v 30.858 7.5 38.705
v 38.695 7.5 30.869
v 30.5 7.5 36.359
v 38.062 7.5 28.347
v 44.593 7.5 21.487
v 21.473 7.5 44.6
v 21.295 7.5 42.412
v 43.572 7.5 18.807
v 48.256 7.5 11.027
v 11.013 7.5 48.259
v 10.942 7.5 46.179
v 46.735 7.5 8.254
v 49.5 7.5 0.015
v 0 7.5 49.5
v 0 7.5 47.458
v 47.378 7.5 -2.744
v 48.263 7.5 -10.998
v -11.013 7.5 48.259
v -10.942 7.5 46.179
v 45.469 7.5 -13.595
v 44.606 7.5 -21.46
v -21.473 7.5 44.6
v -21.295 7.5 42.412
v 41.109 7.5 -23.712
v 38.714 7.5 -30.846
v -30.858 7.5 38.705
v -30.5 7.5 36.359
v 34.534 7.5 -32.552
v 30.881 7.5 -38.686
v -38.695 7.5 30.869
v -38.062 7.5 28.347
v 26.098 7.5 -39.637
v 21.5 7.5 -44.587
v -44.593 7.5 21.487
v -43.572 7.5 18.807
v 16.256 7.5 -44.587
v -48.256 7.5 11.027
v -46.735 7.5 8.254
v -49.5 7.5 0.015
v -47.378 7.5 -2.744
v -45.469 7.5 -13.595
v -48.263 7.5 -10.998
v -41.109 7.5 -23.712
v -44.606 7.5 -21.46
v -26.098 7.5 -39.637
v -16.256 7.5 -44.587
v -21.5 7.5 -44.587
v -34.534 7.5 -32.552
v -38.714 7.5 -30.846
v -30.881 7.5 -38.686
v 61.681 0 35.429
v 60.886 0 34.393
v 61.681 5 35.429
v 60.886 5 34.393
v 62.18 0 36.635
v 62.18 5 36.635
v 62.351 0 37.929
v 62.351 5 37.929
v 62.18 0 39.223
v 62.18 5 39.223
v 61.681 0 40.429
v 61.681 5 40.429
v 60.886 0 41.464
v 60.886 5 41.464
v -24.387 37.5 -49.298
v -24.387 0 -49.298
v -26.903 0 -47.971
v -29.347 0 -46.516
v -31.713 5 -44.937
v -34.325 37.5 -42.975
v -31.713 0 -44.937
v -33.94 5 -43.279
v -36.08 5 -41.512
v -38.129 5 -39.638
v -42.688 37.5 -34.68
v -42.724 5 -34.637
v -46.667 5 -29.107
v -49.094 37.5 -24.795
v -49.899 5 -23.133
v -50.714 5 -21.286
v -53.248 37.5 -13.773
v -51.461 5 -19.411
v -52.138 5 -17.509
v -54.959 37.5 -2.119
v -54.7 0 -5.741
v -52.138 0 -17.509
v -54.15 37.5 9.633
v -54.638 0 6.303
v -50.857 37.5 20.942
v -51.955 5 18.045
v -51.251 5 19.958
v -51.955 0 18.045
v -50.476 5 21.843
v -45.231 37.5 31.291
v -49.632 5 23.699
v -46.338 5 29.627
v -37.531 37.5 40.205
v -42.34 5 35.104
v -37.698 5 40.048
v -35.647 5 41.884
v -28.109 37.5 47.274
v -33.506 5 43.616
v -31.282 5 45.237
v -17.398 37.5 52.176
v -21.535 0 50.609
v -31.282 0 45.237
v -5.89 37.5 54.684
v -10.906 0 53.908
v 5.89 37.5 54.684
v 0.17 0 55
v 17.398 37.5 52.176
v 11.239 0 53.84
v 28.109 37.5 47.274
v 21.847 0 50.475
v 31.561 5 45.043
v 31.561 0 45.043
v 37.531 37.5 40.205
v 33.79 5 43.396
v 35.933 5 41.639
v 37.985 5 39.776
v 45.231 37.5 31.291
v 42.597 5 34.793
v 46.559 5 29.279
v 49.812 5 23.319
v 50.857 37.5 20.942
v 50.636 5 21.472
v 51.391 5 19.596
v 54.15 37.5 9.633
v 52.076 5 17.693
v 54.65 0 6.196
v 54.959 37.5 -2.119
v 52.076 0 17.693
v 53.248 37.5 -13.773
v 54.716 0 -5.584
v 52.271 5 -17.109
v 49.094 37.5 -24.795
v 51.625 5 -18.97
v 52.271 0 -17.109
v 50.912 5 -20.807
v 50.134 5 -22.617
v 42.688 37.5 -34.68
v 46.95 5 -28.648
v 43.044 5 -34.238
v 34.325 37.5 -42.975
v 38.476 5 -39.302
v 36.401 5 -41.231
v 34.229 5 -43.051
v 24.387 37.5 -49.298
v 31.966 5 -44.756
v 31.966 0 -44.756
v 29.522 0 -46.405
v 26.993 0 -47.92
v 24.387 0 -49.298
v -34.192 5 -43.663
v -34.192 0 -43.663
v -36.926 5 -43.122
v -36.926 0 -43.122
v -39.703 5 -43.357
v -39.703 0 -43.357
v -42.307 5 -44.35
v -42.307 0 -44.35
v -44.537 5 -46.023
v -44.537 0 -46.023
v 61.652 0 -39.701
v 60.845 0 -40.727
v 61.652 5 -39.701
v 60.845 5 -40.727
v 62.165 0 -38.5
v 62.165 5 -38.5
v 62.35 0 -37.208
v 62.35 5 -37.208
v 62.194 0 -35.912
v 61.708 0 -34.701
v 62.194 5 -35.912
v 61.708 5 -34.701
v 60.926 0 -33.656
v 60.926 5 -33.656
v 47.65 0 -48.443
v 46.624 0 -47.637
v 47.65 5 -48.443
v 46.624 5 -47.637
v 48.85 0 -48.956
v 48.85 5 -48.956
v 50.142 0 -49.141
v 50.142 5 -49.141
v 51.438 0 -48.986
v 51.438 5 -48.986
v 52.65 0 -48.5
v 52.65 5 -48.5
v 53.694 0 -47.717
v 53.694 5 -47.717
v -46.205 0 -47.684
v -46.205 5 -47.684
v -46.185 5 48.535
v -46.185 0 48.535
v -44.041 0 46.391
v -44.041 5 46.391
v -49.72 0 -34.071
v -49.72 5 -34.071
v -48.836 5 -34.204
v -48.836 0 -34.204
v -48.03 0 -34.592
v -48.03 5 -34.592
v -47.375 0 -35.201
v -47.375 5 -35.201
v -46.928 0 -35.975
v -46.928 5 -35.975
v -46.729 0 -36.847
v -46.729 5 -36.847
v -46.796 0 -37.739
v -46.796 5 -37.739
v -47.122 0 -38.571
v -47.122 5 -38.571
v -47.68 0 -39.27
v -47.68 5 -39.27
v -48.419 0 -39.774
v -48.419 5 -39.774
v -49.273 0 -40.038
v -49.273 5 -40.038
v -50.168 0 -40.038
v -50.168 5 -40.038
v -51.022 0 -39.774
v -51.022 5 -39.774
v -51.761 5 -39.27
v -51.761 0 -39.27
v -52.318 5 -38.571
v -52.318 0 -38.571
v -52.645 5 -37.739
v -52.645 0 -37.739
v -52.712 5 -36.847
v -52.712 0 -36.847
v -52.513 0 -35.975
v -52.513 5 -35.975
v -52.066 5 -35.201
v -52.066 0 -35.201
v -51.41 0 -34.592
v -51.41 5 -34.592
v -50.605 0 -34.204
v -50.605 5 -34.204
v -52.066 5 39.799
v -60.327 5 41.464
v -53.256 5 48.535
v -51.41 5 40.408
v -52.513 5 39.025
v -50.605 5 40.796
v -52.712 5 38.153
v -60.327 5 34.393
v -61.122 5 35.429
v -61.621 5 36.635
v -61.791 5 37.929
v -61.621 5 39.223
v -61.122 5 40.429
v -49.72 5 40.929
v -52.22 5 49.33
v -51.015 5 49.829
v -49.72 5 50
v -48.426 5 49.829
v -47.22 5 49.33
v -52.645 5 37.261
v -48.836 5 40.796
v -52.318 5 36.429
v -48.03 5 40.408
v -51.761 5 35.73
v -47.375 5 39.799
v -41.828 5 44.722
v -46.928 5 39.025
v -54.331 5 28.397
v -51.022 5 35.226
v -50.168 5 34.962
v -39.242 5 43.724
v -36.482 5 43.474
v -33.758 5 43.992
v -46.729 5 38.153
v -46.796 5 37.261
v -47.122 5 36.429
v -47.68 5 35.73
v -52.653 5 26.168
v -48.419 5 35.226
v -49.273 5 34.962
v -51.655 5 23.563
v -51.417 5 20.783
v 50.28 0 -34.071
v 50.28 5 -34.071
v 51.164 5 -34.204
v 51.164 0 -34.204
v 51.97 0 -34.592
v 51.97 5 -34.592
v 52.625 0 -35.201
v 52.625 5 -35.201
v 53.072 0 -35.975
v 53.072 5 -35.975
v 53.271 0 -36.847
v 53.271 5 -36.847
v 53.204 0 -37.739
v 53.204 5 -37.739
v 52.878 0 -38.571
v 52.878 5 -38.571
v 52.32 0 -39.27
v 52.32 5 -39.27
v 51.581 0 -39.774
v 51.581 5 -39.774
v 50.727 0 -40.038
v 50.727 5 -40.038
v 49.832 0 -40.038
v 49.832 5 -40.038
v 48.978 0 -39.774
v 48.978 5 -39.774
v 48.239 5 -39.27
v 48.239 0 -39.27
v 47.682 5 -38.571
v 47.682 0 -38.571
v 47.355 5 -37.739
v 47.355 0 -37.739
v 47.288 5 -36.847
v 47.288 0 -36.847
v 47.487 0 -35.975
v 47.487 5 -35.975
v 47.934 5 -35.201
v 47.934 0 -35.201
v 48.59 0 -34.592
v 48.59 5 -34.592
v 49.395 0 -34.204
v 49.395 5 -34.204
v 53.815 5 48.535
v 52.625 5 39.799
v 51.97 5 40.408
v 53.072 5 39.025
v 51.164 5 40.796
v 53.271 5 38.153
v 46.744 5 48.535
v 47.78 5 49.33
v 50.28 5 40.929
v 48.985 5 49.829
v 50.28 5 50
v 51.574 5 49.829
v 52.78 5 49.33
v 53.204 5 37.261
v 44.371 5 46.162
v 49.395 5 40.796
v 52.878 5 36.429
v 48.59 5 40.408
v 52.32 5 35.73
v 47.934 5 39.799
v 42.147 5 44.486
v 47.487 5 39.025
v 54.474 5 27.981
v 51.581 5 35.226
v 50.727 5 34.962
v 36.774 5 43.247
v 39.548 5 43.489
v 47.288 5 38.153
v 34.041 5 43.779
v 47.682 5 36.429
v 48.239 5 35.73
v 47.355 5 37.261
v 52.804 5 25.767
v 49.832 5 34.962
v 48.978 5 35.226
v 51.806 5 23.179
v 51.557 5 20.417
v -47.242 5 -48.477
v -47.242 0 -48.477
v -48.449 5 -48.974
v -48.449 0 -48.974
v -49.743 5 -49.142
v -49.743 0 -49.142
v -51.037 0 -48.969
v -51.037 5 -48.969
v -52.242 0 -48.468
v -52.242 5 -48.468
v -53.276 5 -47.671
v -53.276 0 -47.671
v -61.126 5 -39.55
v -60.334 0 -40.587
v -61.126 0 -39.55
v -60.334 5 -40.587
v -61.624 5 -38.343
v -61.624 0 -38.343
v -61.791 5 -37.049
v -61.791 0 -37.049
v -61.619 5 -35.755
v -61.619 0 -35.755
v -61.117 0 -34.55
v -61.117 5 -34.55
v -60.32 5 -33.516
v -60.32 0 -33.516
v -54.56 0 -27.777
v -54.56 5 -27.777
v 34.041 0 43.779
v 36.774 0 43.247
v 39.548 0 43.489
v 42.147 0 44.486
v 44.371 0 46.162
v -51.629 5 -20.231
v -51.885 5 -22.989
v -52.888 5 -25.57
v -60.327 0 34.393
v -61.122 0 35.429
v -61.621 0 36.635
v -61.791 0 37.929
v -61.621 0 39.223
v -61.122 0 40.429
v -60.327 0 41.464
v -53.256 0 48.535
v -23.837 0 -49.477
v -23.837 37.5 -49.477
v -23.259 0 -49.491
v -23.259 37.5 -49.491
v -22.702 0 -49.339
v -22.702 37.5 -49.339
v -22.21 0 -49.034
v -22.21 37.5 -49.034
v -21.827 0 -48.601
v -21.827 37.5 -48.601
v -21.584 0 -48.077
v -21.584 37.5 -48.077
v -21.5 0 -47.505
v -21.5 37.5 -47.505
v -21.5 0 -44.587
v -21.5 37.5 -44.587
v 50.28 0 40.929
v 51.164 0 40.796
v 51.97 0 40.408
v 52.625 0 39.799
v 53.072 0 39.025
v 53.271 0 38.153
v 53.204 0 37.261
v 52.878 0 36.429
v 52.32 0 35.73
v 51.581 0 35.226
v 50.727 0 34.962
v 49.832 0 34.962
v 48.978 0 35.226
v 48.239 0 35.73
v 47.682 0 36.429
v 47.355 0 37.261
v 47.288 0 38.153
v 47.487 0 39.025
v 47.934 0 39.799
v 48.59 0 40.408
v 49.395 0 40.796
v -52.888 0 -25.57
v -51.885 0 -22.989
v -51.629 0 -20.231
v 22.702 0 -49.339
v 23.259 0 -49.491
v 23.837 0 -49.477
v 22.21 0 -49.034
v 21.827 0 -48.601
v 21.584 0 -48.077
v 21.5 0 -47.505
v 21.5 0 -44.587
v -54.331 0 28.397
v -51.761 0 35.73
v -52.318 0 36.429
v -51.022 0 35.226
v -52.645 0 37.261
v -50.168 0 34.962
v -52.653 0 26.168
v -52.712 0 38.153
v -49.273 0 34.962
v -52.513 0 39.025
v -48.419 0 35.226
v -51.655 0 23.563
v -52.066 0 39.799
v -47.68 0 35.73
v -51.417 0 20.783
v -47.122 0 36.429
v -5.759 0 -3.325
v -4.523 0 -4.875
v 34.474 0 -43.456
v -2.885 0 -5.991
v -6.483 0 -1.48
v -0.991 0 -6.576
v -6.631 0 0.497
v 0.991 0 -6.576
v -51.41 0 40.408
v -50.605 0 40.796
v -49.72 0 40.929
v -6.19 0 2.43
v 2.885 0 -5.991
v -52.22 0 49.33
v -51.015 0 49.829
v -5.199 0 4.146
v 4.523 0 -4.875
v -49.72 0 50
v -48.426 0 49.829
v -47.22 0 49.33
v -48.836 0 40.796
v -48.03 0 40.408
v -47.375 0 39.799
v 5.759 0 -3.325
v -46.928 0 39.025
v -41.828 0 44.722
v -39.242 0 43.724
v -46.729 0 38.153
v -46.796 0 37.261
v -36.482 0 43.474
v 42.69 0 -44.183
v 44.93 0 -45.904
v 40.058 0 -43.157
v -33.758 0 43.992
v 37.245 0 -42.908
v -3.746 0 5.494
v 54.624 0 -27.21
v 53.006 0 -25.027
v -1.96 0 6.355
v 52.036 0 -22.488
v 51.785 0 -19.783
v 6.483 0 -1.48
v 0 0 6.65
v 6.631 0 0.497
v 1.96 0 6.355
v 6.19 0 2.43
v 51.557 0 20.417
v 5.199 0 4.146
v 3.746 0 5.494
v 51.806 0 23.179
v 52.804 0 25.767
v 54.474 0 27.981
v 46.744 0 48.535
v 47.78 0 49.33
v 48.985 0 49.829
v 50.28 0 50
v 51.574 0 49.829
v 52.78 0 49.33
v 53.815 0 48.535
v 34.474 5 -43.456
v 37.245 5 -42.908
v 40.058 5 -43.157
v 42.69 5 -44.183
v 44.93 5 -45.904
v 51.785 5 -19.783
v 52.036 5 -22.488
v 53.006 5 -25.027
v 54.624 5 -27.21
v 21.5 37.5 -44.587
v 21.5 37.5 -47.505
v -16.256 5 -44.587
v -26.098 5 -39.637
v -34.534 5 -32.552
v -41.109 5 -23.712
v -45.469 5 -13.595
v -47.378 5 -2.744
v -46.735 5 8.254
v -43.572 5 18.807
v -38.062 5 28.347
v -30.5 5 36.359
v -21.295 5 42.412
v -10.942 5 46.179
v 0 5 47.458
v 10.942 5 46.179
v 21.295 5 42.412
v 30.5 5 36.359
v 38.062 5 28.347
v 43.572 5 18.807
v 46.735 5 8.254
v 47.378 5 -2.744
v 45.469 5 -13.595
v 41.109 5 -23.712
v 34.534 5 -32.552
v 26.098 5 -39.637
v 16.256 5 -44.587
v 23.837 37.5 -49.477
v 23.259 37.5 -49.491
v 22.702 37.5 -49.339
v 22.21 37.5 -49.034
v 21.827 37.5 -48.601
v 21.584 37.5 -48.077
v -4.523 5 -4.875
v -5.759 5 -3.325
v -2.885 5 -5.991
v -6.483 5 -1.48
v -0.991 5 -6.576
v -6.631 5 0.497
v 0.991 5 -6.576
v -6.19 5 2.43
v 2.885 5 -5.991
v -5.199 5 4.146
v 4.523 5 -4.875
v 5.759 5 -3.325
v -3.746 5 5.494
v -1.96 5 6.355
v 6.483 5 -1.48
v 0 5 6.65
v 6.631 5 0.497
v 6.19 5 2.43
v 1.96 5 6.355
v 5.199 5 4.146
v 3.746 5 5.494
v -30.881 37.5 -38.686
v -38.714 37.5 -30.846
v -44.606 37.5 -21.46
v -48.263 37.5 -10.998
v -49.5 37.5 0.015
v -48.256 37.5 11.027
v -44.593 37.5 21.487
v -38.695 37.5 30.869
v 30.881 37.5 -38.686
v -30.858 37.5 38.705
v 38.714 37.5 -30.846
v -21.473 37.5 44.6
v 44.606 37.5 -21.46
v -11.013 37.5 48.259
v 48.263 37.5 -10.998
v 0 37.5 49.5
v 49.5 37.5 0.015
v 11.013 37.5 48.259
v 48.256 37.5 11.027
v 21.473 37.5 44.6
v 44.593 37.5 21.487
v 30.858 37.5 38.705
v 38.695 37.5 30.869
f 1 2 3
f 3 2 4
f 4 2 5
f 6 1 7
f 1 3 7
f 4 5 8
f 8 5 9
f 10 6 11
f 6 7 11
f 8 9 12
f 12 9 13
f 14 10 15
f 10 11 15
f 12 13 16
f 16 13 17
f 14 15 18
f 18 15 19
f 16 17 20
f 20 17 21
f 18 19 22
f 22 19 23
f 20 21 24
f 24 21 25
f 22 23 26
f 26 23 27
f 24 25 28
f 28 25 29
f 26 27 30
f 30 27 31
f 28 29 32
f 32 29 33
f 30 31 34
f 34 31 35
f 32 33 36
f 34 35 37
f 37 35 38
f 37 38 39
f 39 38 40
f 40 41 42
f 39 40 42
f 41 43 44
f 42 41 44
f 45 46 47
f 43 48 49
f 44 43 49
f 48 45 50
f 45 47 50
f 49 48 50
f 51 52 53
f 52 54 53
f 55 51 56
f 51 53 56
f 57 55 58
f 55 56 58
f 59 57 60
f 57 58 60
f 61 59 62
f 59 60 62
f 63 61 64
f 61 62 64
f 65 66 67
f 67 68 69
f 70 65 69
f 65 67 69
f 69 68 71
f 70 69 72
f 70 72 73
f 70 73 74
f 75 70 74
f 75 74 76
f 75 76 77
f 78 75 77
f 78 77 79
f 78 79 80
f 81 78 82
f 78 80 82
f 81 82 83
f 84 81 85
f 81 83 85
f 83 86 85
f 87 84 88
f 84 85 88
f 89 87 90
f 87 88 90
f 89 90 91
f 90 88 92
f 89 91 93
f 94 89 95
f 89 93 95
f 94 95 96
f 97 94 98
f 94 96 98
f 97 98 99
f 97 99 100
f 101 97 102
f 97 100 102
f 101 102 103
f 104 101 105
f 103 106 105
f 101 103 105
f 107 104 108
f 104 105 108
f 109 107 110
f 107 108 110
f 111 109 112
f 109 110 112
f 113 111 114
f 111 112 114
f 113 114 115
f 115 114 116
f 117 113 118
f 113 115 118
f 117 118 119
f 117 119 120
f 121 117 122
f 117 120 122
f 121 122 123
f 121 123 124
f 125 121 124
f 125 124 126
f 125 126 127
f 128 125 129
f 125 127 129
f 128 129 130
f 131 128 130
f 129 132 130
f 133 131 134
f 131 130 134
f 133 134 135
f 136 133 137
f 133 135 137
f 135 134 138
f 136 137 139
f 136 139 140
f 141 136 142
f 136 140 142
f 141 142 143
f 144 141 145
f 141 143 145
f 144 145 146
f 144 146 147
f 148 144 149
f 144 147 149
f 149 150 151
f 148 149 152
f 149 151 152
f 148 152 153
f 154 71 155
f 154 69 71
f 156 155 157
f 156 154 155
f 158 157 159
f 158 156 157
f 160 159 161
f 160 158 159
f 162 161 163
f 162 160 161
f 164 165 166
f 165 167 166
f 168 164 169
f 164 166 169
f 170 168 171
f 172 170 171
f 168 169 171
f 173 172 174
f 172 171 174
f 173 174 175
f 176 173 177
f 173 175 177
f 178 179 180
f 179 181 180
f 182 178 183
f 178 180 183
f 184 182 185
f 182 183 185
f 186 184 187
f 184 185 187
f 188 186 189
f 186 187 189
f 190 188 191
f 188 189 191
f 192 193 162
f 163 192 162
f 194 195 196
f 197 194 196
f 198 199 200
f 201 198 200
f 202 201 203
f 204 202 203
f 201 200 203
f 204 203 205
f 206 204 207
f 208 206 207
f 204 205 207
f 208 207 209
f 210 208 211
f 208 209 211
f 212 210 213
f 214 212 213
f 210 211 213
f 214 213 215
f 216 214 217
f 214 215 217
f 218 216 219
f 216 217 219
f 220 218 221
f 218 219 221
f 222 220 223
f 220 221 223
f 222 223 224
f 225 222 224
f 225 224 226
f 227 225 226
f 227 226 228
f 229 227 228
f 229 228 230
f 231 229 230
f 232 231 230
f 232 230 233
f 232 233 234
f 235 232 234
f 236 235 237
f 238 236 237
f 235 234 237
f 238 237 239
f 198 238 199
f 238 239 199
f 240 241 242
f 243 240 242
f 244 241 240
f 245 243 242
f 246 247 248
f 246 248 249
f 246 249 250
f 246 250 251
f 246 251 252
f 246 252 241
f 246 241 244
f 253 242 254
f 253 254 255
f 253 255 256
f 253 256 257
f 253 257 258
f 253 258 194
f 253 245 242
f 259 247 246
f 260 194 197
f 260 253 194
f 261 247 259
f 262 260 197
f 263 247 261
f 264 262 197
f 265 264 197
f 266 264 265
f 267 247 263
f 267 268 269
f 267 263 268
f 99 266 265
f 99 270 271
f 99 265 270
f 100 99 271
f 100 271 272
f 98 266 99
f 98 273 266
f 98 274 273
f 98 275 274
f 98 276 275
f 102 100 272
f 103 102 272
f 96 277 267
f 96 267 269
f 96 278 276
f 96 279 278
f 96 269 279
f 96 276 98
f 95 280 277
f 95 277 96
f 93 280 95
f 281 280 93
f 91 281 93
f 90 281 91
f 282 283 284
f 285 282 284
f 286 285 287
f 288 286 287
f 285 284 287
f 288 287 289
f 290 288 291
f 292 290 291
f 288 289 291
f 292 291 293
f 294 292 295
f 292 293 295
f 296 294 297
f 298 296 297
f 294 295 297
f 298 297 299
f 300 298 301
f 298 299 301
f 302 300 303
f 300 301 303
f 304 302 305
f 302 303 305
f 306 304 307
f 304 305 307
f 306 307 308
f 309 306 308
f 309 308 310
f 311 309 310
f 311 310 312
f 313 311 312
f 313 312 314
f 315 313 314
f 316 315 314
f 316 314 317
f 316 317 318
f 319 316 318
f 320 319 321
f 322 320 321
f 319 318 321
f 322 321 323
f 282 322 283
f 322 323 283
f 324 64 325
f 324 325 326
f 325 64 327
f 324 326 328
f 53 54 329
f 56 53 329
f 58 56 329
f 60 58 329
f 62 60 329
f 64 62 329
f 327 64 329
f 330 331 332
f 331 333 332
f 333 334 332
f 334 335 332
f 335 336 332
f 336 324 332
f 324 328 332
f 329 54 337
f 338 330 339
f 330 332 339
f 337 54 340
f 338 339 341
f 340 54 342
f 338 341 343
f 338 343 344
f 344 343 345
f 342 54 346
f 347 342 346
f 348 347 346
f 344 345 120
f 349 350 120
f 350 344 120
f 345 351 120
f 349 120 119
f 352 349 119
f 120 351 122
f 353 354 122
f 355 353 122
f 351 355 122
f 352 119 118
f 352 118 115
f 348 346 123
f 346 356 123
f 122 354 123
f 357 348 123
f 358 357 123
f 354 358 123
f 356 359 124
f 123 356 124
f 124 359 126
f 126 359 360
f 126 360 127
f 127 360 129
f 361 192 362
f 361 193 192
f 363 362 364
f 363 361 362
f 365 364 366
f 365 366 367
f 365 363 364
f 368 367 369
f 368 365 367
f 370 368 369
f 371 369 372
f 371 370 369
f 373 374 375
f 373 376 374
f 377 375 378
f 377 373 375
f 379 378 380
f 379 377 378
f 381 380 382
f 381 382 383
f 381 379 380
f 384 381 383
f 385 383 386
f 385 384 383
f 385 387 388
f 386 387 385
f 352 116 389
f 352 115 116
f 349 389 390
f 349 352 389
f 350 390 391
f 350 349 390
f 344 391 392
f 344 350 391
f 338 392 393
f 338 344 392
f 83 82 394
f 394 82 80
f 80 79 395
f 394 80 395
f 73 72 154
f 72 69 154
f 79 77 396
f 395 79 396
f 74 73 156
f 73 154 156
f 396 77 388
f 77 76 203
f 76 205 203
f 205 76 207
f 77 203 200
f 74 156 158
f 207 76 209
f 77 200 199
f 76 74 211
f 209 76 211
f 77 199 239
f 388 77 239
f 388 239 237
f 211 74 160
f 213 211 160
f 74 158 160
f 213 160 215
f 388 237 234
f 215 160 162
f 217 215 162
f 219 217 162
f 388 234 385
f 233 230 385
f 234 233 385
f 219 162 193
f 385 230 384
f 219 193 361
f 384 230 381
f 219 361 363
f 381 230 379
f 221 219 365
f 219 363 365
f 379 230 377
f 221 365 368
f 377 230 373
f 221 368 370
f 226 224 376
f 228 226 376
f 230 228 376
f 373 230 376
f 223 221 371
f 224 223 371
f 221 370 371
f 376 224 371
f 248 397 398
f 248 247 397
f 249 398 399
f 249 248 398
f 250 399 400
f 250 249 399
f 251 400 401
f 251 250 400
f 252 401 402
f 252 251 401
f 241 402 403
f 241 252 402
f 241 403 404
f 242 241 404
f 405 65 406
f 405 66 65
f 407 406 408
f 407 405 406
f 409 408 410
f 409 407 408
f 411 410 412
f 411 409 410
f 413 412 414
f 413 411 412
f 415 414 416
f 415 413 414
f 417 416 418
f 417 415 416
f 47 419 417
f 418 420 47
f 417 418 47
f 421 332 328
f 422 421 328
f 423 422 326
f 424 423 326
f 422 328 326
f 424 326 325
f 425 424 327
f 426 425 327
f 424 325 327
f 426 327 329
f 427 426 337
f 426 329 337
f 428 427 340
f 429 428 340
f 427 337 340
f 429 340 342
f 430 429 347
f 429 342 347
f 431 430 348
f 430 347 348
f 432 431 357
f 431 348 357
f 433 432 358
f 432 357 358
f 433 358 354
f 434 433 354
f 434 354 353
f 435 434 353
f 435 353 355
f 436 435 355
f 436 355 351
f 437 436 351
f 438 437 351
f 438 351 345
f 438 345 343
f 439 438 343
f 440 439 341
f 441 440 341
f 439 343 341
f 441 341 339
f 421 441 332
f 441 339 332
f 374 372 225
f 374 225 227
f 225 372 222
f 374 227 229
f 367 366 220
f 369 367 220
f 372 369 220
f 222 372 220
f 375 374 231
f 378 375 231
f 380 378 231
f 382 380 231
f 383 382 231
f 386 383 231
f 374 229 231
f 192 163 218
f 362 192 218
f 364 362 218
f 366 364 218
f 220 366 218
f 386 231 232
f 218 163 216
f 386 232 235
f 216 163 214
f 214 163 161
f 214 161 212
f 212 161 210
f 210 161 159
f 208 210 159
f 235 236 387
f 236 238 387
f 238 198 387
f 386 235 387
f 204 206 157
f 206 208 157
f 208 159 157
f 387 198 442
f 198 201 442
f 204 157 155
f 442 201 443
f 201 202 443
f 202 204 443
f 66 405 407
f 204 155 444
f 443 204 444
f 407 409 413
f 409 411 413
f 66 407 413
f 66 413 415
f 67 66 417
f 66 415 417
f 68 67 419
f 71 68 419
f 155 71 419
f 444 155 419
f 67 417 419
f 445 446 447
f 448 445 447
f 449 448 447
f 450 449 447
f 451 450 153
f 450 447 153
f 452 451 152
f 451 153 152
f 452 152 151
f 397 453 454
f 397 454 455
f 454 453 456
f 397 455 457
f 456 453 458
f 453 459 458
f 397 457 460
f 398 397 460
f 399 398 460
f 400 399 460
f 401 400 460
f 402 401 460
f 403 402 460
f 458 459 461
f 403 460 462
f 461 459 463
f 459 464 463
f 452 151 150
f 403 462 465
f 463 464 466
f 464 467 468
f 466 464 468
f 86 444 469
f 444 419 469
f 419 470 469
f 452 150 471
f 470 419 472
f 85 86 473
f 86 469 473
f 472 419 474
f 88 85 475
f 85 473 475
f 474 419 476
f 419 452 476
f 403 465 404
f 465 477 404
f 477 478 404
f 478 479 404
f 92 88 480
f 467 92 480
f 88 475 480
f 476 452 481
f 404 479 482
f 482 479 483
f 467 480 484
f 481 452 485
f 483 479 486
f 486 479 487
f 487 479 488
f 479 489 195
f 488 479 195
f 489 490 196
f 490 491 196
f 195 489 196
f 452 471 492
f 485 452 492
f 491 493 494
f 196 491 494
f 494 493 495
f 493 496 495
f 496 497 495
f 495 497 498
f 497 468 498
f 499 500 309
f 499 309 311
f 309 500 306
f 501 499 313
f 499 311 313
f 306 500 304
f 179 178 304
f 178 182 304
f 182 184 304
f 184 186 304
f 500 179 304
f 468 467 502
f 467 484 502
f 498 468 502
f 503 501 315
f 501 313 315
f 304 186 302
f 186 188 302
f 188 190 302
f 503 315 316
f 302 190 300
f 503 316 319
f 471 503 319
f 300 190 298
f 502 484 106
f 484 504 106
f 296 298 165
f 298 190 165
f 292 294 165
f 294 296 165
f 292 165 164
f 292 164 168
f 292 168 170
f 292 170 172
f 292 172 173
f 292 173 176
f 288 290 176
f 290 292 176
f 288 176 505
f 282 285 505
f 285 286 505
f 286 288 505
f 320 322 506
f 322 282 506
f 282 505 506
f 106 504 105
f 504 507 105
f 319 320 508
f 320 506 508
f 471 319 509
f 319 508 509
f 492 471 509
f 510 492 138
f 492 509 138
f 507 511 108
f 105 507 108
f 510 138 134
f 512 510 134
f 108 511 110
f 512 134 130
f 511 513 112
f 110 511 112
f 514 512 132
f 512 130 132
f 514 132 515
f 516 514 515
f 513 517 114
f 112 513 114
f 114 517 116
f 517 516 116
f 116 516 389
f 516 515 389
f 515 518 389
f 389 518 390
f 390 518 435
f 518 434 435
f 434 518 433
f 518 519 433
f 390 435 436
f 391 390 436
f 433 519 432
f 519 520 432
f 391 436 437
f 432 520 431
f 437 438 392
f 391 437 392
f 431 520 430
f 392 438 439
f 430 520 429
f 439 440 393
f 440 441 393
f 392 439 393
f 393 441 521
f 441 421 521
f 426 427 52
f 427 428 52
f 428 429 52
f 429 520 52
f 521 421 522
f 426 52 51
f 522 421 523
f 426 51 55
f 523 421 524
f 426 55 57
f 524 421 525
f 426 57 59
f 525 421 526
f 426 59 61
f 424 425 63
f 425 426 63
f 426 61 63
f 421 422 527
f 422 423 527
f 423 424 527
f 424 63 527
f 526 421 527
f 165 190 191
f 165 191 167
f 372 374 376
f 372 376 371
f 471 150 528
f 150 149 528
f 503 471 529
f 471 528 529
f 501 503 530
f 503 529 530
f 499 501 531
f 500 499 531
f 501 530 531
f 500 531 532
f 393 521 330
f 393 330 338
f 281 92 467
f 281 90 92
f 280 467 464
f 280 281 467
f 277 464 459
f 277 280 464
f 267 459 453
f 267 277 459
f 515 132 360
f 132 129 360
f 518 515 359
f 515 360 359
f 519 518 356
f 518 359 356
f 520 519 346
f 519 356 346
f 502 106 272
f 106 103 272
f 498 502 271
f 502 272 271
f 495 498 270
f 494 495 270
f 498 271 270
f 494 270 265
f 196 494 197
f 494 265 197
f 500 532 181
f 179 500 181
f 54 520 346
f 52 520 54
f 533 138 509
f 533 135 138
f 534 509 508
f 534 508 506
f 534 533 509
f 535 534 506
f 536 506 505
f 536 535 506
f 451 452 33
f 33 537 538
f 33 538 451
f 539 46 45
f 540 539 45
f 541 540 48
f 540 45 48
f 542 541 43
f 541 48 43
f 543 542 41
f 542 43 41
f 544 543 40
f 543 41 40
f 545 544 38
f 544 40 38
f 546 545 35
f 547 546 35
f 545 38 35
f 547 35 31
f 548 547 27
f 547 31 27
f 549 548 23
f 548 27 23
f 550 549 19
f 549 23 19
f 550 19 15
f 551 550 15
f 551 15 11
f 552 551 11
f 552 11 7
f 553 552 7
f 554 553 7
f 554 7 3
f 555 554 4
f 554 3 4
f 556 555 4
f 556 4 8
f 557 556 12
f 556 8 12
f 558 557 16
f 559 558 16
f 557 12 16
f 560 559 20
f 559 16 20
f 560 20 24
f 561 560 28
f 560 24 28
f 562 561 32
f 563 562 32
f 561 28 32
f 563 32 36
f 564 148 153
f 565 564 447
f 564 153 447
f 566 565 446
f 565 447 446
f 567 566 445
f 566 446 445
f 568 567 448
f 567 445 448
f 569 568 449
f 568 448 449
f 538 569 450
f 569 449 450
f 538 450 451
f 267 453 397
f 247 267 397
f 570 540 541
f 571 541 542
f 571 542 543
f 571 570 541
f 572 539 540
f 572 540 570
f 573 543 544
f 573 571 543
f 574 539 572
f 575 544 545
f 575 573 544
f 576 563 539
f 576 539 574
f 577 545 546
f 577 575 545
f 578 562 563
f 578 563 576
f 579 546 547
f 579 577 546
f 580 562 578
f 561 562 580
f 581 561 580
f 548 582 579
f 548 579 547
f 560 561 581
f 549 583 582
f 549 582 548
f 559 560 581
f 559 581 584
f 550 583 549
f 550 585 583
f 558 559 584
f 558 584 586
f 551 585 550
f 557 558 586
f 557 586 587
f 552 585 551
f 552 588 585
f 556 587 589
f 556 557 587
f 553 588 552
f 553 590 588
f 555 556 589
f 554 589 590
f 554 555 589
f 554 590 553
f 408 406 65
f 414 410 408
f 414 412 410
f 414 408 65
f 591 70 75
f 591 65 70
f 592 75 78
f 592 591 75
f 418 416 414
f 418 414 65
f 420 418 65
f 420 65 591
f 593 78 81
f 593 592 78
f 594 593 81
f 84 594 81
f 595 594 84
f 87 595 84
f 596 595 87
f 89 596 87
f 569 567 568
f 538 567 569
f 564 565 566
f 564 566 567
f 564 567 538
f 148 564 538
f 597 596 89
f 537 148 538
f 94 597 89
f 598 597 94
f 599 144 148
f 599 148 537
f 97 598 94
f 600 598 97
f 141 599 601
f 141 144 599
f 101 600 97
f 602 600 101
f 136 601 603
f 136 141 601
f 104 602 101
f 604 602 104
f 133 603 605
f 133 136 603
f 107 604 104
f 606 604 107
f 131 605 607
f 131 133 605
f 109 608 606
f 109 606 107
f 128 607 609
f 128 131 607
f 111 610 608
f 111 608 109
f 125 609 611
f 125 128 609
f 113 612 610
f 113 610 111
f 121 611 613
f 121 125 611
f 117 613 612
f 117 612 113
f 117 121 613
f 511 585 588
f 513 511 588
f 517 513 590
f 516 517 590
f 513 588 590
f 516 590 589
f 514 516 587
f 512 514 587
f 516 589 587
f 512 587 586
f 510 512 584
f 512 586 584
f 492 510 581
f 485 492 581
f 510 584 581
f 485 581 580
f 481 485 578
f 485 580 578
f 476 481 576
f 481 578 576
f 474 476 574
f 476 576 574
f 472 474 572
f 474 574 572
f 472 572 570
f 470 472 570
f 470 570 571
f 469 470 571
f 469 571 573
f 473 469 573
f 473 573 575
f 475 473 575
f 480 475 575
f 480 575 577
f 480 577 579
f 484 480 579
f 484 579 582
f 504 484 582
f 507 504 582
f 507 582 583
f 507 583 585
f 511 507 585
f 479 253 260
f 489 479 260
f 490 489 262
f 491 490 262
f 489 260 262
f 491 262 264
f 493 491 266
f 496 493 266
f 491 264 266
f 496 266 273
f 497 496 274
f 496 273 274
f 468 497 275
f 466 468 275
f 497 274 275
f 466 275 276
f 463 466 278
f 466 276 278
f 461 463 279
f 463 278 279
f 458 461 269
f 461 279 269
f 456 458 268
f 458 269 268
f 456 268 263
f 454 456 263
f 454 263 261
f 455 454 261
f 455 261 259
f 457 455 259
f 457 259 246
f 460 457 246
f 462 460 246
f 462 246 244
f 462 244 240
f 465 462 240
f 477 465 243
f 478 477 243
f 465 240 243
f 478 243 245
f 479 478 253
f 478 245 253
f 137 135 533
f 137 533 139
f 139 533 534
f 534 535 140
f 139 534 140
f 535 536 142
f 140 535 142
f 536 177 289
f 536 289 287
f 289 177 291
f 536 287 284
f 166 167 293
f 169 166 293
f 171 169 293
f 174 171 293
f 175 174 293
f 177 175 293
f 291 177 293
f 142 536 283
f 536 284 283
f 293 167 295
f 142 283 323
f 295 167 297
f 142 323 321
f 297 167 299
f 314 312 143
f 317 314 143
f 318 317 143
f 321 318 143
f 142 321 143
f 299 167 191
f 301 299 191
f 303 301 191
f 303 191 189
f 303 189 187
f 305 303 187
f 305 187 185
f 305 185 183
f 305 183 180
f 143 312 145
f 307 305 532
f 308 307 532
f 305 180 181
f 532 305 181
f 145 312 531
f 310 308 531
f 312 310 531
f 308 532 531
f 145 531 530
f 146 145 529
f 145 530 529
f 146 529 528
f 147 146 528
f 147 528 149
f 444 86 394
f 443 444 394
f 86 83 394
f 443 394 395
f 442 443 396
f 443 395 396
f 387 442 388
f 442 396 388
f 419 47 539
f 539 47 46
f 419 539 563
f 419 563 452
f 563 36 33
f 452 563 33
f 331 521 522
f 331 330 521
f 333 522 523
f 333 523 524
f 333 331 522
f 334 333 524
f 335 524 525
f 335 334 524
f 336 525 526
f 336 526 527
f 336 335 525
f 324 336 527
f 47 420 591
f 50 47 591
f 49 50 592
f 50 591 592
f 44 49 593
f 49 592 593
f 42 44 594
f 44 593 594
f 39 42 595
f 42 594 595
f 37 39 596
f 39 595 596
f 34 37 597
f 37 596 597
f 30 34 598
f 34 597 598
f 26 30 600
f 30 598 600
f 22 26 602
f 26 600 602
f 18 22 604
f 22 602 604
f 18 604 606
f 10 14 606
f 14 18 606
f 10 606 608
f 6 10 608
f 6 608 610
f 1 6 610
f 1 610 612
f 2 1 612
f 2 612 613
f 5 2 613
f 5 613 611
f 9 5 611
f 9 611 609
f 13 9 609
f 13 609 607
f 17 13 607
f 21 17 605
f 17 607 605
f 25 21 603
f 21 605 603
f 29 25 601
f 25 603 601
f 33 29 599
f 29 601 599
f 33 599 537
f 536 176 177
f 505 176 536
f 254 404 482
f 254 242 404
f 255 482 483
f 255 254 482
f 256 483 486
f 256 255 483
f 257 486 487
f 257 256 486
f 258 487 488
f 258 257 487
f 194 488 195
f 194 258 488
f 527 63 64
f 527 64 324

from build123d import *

# Parameters (mm, degrees)
SKETCH_1_R          = 55
EXTRUDE_1_DEPTH     = 37.5
SKETCH_3_R          = 49.5
CUT_EXTRUDE_1_DEPTH = 32.5
SKETCH_5_W          = 43
SKETCH_5_H          = 12.242897151
CUT_EXTRUDE_2_DEPTH = 40
FILLET_4_R          = 2
FILLET_5_R          = 2
SKETCH_6_R          = 6.65
CUT_EXTRUDE_3_DEPTH = 12
EXTRUDE_START       = -5
EXTRUDE_3_DEPTH     = 5
FILLET_7_R          = 10
FILLET_8_R          = 5
SKETCH_10_R         = 3
CUT_EXTRUDE_5_DEPTH = 5
EXTRUDE_START_2     = 2.5
EXTRUDE_4_DEPTH     = 2.5


with BuildPart() as part:
    # 草图1 → 凸台-拉伸1 (new body)
    with BuildSketch(Plane(origin=(0, 0, 0), x_dir=(1, 0, 0), z_dir=(0, 1, 0))):
        with Locations(Location((0, 0, 0), (0, 0, 270))):
            Circle(SKETCH_1_R)
    extrude(amount=EXTRUDE_1_DEPTH)

    # 草图3 → 切除-拉伸1 (cut)
    with BuildSketch(Plane(origin=(0, 37.5, 0), x_dir=(1, 0, 0), z_dir=(0, 1, 0))):
        with Locations(Location((0, 0, 0), (0, 0, 270))):
            Circle(SKETCH_3_R)
    extrude(amount=-CUT_EXTRUDE_1_DEPTH, mode=Mode.SUBTRACT)

    # 草图5 → 切除-拉伸2 (cut)
    with BuildSketch(Plane(origin=(0, 37.5, 0), x_dir=(1, 0, 0), z_dir=(0, 1, 0))):
        with Locations((0, 50.708442195)):
            Rectangle(SKETCH_5_W, SKETCH_5_H)
    extrude(amount=-CUT_EXTRUDE_2_DEPTH, mode=Mode.SUBTRACT)

    # 圆角4
    fillet_4_edges = [part.edges().sort_by_distance(p)[0] for p in [
        (-21.5, 18.75, -50.623611092),
    ]]
    fillet(fillet_4_edges, radius=FILLET_4_R)

    # 圆角5
    fillet_5_edges = [part.edges().sort_by_distance(p)[0] for p in [
        (21.5, 18.75, -50.623611092),
    ]]
    fillet(fillet_5_edges, radius=FILLET_5_R)

    # 草图6 → 切除-拉伸3 (cut)
    with BuildSketch(Plane(origin=(0, 5, 0), x_dir=(1, 0, 0), z_dir=(0, 1, 0))):
        with Locations(Location((0, 0, 0), (0, 0, 270))):
            Circle(SKETCH_6_R)
    extrude(amount=-CUT_EXTRUDE_3_DEPTH, mode=Mode.SUBTRACT)

    # 草图14 → 凸台-拉伸3 (add)
    with BuildSketch(Plane(origin=(0, 5, 0), x_dir=(1, 0, 0), z_dir=(0, 1, 0)).offset(EXTRUDE_START)):
        with BuildLine():
            Line((-49.898576095, 23.132922507), (-63.862525635, 37.044772973))
            Line((-63.862525635, 37.044772973), (-49.746845912, 51.213315099))
            Line((-49.746845912, 51.213315099), (-38.128637352, 39.638453724))
            ThreePointArc((-38.128637352, 39.638453724), (-44.78063998, 31.932652301), (-49.898576095, 23.132922507))
        make_face()
        with BuildLine():
            Line((49.811900188, -23.3189751), (64.421720913, -37.928795825))
            Line((64.421720913, -37.928795825), (50.279585289, -52.070931449))
            Line((50.279585289, -52.070931449), (37.984884655, -39.776230814))
            ThreePointArc((37.984884655, -39.776230814), (44.662950793, -32.097053236), (49.811900188, -23.3189751))
        make_face()
        with BuildLine():
            Line((-49.632393674, -23.698639164), (-63.862550335, -37.928795825))
            Line((-63.862550335, -37.928795825), (-49.720414711, -52.070931449))
            Line((-49.720414711, -52.070931449), (-37.697852746, -40.048369484))
            ThreePointArc((-37.697852746, -40.048369484), (-44.423770724, -32.427281642), (-49.632393674, -23.698639164))
        make_face()
        with BuildLine():
            Line((38.475737251, 39.301623923), (50.118901666, 51.212426922))
            Line((50.118901666, 51.212426922), (64.420808036, 37.231887798))
            Line((64.420808036, 37.231887798), (50.134465219, 22.6171483))
            ThreePointArc((50.134465219, 22.6171483), (45.083643676, 31.50341367), (38.475737251, 39.301623923))
        make_face()
    extrude(amount=EXTRUDE_3_DEPTH)

    # 圆角7
    fillet_7_edges = [part.edges().sort_by_distance(p)[0] for p in [
        (-38.128637352, 2.5, -39.638453724),
        (-49.898576095, 2.5, -23.132922507),
        (-49.632393674, 2.5, 23.698639164),
        (-37.697852746, 2.5, 40.048369484),
        (50.134465219, 2.5, -22.6171483),
        (38.475737251, 2.5, -39.301623923),
        (37.984884655, 2.5, 39.776230814),
        (49.811900188, 2.5, 23.3189751),
    ]]
    fillet(fillet_7_edges, radius=FILLET_7_R)

    # 圆角8
    fillet_8_edges = [part.edges().sort_by_distance(p)[0] for p in [
        (-63.862525635, 2.5, -37.044772973),
        (-49.746845912, 2.5, -51.213315099),
        (-49.720414711, 2.5, 52.070931449),
        (-63.862550335, 2.5, 37.928795825),
        (50.118901666, 2.5, -51.212426922),
        (64.420808036, 2.5, -37.231887798),
        (50.279585289, 2.5, 52.070931449),
        (64.421720913, 2.5, 37.928795825),
    ]]
    fillet(fillet_8_edges, radius=FILLET_8_R)

    # 草图10 → 切除-拉伸5 (cut)
    with BuildSketch(Plane(origin=(0, 5, 0), x_dir=(1, 0, 0), z_dir=(0, 1, 0))):
        with Locations(Location((-49.720414711, 37.071204175, 0), (0, 0, 270))):
            Circle(SKETCH_10_R)
        with Locations(Location((50.279585289, 37.071204175, 0), (0, 0, 270))):
            Circle(SKETCH_10_R)
        with Locations(Location((-49.720414711, -37.928795825, 0), (0, 0, 270))):
            Circle(SKETCH_10_R)
        with Locations(Location((50.279585289, -37.928795825, 0), (0, 0, 270))):
            Circle(SKETCH_10_R)
    extrude(amount=-CUT_EXTRUDE_5_DEPTH, mode=Mode.SUBTRACT)

    # 草图15 → 凸台-拉伸4 (add)
    with BuildSketch(Plane(origin=(0, 5, 0), x_dir=(1, 0, 0), z_dir=(0, 1, 0)).offset(EXTRUDE_START_2)):
        with BuildLine():
            Line((-21.5, 44.586993619), (-16.255768207, 44.586993619))
            ThreePointArc((-16.255768207, 44.586993619), (0, -47.457876059), (16.255768207, 44.586993619))
            Line((16.255768207, 44.586993619), (21.5, 44.586993619))
            ThreePointArc((21.5, 44.586993619), (0, -49.5), (-21.5, 44.586993619))
        make_face()
    extrude(amount=-EXTRUDE_4_DEPTH)


solid = part.part
